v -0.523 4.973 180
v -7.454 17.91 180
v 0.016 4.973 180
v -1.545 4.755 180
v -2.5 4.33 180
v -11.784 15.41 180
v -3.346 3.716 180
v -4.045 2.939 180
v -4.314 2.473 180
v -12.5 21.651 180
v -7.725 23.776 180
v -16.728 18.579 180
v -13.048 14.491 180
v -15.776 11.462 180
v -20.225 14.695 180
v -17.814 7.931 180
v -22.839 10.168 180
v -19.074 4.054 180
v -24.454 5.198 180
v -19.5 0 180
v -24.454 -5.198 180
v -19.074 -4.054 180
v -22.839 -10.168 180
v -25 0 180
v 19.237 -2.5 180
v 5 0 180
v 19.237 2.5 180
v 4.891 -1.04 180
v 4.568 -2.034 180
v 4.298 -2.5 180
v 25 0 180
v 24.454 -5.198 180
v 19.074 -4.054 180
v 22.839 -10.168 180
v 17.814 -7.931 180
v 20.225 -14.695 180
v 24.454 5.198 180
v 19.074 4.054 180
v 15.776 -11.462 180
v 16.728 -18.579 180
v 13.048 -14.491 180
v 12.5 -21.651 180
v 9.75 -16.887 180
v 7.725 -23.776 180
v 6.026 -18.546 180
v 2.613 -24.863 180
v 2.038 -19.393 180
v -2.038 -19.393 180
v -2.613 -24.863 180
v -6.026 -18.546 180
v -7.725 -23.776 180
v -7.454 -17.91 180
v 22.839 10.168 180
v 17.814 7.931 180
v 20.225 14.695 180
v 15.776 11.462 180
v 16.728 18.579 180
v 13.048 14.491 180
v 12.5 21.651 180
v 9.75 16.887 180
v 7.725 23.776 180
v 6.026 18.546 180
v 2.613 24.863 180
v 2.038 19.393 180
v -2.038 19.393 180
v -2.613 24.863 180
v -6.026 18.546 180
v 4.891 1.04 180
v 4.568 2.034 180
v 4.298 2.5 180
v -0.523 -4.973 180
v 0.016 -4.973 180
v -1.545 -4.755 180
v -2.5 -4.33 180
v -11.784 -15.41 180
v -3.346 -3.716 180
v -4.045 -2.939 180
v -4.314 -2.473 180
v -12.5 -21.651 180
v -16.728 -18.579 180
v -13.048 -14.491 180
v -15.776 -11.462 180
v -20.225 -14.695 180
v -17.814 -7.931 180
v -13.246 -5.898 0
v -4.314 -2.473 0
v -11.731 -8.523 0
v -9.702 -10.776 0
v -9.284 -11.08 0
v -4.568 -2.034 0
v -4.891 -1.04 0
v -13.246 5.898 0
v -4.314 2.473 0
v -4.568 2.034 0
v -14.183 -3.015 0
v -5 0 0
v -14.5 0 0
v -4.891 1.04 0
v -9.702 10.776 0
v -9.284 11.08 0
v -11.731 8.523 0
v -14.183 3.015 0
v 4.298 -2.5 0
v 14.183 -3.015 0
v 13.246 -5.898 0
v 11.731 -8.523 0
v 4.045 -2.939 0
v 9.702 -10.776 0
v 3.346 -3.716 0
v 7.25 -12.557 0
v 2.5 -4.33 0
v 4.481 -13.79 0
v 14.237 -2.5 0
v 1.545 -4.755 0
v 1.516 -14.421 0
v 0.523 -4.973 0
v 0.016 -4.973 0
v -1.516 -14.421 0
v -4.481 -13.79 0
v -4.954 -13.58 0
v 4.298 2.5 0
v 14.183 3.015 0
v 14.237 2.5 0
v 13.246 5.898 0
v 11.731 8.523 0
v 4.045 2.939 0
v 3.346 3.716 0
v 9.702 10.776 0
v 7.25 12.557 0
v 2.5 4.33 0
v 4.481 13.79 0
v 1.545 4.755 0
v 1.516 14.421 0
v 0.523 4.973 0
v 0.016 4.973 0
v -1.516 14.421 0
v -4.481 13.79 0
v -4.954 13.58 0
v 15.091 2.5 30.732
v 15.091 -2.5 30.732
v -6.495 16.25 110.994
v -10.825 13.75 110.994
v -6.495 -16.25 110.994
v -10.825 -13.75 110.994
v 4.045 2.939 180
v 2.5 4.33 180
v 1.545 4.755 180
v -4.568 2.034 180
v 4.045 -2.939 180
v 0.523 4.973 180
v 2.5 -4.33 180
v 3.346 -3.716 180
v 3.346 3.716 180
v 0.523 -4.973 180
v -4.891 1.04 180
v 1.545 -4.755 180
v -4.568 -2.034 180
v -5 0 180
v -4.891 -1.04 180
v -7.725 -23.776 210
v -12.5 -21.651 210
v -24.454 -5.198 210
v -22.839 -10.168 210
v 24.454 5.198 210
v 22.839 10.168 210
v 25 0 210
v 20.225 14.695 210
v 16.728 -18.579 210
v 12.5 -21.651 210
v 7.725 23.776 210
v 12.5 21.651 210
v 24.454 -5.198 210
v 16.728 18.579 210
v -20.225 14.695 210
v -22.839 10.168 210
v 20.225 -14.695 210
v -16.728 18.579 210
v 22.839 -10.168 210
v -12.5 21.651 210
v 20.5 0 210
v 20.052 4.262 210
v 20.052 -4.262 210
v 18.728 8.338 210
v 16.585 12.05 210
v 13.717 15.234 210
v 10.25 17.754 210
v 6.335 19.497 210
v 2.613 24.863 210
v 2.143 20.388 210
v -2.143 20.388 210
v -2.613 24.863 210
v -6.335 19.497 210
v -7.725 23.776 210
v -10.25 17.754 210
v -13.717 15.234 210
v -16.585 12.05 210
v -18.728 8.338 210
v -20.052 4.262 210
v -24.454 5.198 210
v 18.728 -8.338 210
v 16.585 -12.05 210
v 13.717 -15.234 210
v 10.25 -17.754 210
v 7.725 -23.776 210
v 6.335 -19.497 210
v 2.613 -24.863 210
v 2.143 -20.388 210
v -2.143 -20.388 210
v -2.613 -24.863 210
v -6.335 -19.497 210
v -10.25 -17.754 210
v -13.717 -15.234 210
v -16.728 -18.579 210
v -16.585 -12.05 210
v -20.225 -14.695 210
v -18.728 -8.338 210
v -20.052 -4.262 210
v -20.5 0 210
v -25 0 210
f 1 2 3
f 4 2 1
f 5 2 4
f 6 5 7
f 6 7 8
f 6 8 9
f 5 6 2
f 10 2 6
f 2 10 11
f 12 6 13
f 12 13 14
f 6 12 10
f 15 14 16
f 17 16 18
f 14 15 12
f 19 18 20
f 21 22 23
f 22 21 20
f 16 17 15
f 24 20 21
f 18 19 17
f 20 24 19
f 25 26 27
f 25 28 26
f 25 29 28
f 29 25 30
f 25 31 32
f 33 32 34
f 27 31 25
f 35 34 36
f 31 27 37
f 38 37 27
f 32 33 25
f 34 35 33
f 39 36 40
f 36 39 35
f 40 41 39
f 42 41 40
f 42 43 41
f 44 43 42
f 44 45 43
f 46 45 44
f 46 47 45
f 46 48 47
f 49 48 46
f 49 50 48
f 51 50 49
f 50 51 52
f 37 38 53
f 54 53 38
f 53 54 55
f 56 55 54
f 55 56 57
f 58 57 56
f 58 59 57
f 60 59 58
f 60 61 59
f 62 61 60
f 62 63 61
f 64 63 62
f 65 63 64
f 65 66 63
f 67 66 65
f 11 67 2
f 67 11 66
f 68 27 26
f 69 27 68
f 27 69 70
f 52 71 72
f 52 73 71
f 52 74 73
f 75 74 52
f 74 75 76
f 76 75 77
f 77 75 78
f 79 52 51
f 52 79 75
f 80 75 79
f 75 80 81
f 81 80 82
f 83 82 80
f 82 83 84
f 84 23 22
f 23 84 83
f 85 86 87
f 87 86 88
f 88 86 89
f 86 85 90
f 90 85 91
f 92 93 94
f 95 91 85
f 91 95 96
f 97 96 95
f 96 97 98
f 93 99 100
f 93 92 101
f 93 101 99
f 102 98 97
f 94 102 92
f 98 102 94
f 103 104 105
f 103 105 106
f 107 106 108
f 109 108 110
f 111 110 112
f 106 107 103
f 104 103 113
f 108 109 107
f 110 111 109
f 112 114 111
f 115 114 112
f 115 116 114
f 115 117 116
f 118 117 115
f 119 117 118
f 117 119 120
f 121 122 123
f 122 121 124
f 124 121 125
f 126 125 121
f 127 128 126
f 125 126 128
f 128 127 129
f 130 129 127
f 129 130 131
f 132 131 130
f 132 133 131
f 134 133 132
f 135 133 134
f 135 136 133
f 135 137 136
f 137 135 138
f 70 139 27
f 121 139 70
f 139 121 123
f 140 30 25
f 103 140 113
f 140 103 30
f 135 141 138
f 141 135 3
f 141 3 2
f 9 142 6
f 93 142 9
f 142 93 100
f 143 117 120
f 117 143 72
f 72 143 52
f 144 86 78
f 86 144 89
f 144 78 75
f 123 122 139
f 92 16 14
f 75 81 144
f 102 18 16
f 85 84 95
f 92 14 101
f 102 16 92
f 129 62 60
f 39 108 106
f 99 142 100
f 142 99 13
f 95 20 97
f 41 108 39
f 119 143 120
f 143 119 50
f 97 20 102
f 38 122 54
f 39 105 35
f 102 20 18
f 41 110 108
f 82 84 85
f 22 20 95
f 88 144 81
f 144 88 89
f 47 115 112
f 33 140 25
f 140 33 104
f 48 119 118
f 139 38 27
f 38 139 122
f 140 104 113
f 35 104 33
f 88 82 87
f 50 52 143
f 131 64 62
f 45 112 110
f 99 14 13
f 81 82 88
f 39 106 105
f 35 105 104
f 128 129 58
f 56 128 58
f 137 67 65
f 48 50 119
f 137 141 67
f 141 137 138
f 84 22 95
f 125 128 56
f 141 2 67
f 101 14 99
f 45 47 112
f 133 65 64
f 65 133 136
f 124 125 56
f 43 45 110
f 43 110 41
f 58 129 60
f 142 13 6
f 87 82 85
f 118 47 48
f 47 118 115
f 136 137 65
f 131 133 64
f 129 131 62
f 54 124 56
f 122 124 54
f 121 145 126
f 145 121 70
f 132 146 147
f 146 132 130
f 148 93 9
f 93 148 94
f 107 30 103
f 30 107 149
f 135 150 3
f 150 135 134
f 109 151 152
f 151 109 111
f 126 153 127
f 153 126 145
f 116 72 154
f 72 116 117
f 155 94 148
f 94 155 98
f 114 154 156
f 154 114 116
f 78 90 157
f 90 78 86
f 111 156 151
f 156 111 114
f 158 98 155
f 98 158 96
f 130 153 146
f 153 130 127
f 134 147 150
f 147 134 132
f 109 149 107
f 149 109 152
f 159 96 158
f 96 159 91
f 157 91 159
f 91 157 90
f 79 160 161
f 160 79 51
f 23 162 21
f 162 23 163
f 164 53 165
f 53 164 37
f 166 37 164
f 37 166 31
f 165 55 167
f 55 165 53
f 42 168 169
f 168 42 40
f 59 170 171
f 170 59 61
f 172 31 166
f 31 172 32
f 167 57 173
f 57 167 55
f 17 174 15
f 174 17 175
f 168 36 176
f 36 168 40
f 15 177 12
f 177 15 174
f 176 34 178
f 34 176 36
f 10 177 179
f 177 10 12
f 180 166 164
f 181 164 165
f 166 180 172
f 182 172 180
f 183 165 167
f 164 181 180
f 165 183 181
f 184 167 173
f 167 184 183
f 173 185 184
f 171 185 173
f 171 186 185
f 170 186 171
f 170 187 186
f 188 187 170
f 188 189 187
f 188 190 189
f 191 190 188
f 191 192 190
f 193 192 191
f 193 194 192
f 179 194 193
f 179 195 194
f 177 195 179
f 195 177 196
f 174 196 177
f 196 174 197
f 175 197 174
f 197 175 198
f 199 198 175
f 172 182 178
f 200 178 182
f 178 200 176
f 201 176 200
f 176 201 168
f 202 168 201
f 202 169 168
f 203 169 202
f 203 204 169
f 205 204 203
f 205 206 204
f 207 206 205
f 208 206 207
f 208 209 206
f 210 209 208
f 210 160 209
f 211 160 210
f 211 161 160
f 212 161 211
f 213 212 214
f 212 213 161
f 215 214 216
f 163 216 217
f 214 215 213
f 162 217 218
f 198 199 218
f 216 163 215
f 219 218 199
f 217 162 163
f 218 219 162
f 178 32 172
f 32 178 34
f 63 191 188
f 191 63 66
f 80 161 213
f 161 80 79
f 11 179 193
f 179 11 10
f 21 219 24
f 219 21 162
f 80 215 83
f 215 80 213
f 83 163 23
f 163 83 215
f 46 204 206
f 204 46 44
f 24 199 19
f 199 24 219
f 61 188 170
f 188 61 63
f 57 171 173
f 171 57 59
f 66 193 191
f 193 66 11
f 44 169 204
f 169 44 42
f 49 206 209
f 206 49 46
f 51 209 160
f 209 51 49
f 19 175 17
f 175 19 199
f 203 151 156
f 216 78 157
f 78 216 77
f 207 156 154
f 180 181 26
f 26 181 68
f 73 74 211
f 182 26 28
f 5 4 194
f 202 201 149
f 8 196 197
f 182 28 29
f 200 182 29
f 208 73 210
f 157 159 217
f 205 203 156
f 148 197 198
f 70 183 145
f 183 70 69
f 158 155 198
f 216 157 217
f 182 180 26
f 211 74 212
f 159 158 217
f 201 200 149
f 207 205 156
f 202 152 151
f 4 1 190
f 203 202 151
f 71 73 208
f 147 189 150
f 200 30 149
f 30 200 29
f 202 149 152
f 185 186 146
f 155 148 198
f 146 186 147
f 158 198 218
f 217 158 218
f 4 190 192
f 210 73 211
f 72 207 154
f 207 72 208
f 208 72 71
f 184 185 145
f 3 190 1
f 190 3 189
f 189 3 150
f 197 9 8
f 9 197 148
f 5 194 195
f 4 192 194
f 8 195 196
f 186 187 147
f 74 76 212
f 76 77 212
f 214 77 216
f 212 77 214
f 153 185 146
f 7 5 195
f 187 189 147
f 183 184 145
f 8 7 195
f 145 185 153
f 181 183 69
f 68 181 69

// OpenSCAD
//////////////////////////////////////////////
//  ***TeMoG - Tentacle Mold Generator***   //
//  by Jonas Jørgensen (jonj@sdu.dk) 2020   //
//                                          //
//  Shared under a Creative Commons         //
//  Attribution-ShareAlike (CC BY-SA 3.0)   //
//  license                                 //
//////////////////////////////////////////////

//Part 2 - Inner Mold

$fn=30; //Set to 200 when generating the molds for 3D printing

//Main cone and mold
h = 180; //Cone height
maxDiam = 45; //Cone
minDiam = 35; //Cone
centerSolidDiam=10;
moldWallThickness = 3;
footDiam=100; //Foot for mold
siliconeThickness=3; //Outer
dividersThickness = 5;

//Interior
numberOfChambers=3;

//Top part
wireAttachmentYesNo=0; //Set to 1 to generate wire holder at the top of inner mold
straightHeight= 30; 
wiresDiameter=5; 

//Joints
jointThickness = 3;


//Finishing mold:
finMoldHeight=25;
finMoldWidth=30;
supportMoldLength=60;
supportMoldWidth=30;
FinalBottomThickness =8;

union(){

//Three cone parts that make the inside chambers
difference(){
cylinder(h,d2=maxDiam-siliconeThickness*2,d1=minDiam-siliconeThickness*2);
cylinder(h,d2=centerSolidDiam,d1=centerSolidDiam);

for (i = [0:numberOfChambers]) { //Cut away parts to make separate chambers
rotate (i*360/numberOfChambers) translate ([0,-dividersThickness/2,0]) cube([maxDiam, dividersThickness,h], center=[0,0,0]);
}

}

//Top part
difference(){
translate ([0,0,h]) cylinder(straightHeight,d2=maxDiam+6-1,d1=maxDiam+6-1); 
translate ([0,0,h]) cylinder(straightHeight,d2=maxDiam+6-10,d1=centerSolidDiam);
}

if (wireAttachmentYesNo==1){
//Wire attachment
difference(){
translate ([0,0,h+straightHeight-(5/2)]) cube ([maxDiam+6-2, 8, 5], center=true);
translate ([0,0,h+straightHeight-5]) cylinder(5,d2=wiresDiameter,d1=wiresDiameter);
}
}

}
